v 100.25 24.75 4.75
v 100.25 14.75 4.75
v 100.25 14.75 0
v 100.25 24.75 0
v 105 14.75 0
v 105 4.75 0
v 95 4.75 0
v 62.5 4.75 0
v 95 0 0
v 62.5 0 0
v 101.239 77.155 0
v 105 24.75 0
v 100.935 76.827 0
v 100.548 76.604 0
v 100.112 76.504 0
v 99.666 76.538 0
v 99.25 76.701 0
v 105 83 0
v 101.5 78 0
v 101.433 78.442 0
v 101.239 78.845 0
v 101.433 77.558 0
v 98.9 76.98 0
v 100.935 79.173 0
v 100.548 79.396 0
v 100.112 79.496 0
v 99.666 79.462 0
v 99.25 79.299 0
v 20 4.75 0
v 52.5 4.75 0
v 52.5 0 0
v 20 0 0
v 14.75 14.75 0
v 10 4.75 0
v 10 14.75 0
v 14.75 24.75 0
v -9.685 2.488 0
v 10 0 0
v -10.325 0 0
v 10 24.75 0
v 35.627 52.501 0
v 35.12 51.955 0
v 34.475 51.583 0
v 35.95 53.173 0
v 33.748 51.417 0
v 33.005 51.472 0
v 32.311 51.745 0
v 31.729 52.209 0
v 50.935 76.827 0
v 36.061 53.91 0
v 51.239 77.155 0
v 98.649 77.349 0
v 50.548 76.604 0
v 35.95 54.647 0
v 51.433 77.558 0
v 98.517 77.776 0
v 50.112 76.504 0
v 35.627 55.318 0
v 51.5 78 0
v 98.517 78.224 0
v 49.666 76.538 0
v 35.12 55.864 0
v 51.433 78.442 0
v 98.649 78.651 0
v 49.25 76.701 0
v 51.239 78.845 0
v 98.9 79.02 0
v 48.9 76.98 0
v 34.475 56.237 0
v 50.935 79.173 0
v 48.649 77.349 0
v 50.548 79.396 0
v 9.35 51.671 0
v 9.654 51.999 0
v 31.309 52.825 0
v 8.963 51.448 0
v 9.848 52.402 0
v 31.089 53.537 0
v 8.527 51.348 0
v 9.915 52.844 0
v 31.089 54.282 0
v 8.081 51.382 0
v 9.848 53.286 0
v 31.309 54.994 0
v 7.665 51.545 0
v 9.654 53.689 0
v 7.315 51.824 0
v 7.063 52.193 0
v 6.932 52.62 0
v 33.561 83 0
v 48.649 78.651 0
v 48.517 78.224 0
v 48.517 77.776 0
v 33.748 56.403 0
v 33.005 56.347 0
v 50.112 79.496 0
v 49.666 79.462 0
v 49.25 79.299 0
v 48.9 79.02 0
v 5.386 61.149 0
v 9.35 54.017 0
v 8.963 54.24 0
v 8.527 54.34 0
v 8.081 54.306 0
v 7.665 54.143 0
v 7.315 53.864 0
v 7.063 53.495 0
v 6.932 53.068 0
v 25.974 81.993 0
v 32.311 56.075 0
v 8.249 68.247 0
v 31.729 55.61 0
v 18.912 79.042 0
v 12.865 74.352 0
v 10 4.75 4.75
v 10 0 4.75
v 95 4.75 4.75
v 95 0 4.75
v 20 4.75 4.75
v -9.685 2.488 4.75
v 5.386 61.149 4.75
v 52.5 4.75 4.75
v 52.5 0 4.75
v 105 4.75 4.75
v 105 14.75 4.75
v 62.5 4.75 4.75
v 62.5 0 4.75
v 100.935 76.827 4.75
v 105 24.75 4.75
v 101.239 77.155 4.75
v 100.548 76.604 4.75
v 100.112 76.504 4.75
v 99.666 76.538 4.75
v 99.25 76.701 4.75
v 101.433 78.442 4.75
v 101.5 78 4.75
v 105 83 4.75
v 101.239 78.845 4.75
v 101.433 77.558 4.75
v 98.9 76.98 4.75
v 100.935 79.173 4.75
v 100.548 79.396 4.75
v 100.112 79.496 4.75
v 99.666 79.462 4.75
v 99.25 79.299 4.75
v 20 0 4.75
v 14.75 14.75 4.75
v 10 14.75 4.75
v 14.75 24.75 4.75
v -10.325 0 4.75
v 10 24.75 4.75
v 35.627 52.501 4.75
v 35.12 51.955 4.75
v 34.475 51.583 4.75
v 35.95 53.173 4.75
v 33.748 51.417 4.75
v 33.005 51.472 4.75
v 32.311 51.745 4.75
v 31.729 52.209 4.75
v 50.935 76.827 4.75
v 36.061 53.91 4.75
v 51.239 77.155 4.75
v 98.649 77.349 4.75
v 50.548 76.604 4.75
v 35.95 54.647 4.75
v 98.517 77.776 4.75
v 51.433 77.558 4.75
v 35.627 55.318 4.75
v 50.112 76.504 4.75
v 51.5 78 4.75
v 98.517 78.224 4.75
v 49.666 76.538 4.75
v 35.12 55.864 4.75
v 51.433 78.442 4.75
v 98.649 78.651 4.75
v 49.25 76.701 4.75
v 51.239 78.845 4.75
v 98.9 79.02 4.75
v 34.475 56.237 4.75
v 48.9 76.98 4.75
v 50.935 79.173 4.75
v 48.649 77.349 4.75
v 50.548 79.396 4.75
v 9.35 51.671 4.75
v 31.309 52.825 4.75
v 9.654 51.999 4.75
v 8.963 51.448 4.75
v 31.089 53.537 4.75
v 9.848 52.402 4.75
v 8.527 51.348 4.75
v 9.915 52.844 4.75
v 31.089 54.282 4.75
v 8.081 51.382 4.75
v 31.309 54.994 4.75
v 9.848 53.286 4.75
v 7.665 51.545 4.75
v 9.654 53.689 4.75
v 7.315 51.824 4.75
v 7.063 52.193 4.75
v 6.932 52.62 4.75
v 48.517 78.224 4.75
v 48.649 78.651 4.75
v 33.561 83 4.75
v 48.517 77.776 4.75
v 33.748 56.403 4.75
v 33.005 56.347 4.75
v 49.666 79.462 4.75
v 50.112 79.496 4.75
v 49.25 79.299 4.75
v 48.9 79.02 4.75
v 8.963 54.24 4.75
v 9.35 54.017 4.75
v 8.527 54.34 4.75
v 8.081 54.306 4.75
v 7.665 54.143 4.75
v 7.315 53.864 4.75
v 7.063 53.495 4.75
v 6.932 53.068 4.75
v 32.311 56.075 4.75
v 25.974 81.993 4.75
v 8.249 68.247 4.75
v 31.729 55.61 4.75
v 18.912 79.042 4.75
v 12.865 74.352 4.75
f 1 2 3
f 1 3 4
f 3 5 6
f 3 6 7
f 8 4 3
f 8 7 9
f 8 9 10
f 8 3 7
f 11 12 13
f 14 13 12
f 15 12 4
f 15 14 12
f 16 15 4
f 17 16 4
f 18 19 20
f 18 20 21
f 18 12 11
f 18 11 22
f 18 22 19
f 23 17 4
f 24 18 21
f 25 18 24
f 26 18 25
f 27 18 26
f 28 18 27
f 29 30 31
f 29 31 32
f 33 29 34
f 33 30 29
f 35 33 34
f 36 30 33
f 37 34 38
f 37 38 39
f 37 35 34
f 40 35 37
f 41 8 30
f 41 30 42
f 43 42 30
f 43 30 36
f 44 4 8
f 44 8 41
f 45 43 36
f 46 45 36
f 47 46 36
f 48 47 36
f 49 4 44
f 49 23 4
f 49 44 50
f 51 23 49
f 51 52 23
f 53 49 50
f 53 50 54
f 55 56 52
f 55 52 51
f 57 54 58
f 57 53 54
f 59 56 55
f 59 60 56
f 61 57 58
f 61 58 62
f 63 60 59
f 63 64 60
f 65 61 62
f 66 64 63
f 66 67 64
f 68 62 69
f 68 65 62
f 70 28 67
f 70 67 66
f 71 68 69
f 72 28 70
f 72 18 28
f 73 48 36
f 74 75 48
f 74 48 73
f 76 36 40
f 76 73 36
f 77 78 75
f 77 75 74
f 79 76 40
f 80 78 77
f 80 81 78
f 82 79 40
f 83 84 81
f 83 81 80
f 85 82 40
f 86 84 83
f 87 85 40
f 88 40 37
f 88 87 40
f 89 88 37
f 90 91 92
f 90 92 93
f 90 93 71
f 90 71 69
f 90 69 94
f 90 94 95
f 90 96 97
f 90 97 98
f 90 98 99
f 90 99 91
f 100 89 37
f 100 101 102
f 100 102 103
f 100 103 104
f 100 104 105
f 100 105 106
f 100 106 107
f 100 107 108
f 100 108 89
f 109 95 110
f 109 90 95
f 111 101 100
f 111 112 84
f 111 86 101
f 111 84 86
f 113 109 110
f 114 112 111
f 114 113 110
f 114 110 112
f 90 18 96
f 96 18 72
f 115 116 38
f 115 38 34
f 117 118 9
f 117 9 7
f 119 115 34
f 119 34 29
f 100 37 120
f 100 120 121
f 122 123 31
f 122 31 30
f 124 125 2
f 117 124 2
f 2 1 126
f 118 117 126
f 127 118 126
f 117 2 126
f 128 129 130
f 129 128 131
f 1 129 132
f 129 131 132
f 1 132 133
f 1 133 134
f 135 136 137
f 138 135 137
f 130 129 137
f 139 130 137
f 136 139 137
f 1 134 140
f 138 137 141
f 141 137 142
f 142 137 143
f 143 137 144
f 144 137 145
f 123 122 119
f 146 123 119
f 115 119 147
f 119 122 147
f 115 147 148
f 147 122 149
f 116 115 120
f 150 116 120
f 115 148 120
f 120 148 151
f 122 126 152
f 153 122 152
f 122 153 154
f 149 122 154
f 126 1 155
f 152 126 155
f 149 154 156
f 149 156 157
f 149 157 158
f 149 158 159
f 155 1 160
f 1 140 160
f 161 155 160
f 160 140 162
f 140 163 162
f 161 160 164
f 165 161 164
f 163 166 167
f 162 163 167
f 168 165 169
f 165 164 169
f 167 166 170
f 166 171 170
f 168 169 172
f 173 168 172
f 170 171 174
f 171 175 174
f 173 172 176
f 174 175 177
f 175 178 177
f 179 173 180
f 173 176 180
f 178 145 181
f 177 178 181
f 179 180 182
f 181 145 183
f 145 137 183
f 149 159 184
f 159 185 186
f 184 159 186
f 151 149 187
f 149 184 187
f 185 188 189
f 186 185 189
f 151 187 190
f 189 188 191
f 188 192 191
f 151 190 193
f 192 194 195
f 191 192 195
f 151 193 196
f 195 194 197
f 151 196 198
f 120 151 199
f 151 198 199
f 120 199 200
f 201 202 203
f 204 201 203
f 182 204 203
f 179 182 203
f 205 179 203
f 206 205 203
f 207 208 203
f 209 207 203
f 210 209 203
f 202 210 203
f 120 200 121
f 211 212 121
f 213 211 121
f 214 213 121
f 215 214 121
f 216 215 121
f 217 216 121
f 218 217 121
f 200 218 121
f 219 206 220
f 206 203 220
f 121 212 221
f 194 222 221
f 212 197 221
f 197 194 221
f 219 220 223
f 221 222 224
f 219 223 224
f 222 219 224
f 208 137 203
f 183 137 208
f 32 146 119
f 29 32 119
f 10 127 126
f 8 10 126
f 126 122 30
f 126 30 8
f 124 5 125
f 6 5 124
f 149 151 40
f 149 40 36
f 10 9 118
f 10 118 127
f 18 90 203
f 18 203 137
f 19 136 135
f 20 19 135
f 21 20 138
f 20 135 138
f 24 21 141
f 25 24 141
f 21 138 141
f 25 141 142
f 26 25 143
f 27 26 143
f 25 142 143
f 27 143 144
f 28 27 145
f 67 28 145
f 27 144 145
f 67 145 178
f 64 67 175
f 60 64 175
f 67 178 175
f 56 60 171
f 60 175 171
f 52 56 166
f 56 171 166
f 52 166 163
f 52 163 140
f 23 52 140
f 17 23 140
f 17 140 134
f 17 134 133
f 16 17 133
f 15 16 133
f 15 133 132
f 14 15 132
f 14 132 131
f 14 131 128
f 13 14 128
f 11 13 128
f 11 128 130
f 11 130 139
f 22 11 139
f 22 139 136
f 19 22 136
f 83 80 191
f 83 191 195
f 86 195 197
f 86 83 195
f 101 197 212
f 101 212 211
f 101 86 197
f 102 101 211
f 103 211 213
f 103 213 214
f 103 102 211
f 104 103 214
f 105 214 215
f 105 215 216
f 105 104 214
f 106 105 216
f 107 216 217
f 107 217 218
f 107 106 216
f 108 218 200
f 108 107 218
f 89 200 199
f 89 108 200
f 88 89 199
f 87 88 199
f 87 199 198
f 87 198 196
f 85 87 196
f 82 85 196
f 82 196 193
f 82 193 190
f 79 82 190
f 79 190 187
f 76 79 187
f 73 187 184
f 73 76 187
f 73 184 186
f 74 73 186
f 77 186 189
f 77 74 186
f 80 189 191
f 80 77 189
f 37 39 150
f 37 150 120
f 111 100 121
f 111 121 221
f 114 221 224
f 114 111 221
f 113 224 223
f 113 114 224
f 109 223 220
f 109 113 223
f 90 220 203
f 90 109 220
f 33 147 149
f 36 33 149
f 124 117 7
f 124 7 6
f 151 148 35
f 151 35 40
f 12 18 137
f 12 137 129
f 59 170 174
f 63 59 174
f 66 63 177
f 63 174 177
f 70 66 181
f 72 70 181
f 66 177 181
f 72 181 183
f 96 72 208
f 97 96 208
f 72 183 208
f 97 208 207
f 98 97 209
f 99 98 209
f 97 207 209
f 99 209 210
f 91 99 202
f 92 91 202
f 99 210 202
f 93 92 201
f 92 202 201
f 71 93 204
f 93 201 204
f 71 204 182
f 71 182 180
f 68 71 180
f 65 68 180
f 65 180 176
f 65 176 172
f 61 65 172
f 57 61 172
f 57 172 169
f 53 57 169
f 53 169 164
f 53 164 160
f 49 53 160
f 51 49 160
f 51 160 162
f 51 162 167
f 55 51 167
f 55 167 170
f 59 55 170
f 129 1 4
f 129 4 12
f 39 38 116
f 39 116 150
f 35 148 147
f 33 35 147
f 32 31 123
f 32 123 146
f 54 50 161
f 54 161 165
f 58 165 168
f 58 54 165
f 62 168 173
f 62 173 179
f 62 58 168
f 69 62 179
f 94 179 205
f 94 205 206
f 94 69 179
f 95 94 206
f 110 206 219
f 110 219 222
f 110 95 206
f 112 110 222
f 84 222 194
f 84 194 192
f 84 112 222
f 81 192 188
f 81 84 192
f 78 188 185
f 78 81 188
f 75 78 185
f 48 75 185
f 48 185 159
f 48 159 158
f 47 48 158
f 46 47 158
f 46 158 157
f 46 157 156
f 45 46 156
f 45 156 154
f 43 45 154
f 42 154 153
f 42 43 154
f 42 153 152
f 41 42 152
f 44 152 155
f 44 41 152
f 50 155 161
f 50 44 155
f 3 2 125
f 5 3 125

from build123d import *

# Parameters (mm, degrees)
SKETCH1_R           = 2.5
BOSS_EXTRUDE1_DEPTH = 4.75
SKETCH2_W           = 10
SKETCH2_H           = 4.75
SKETCH2_W_2         = 4.75
SKETCH2_H_2         = 10
CUT_EXTRUDE1_DEPTH  = 134.927452376
SKETCH3_R           = 1.5
CUT_EXTRUDE2_DEPTH  = 134.927452376
CAVITY1_OUTLINE_R   = 1.5
CAVITY1_DEPTH       = 4.75


# Read off the part's stored shape, not the designer's step: Cavity1
with BuildPart() as part:
    # Sketch1 → Boss-Extrude1 (new body)
    with BuildSketch(Plane.XY):
        with BuildLine():
            Line((-9.685424338, 2.488484559), (5.386220056, 61.148792841))
            ThreePointArc((5.386220056, 61.148792841), (15.733633721, 76.897010412), (33.561388608, 83))
            Line((33.561388608, 83), (105, 83))
            Line((105, 83), (105, 0))
            Line((105, 0), (-10.324792855, 0))
            Line((-10.324792855, 0), (-9.685424338, 2.488484559))
        make_face()
        with Locations((33.561388608, 53.909722104)):
            Circle(SKETCH1_R, mode=Mode.SUBTRACT)
    extrude(amount=BOSS_EXTRUDE1_DEPTH)

    # Sketch2 → Cut-Extrude1 (cut, through all)
    with BuildSketch(Plane.XY.offset(4.75)):
        with Locations((15, 2.375)):
            Rectangle(SKETCH2_W, SKETCH2_H)
        with Locations((57.5, 2.375)):
            Rectangle(SKETCH2_W, SKETCH2_H)
        with Locations((100, 2.375)):
            Rectangle(SKETCH2_W, SKETCH2_H)
        with Locations((102.625, 19.75)):
            Rectangle(SKETCH2_W_2, SKETCH2_H_2)
        with Locations((12.375, 19.75)):
            Rectangle(SKETCH2_W_2, SKETCH2_H_2)
    extrude(amount=-CUT_EXTRUDE1_DEPTH, mode=Mode.SUBTRACT)

    # Sketch3 → Cut-Extrude2 (cut, through all)
    with BuildSketch(Plane.XY.offset(4.75)):
        with Locations((50, 78)):
            Circle(SKETCH3_R)
        with Locations((100, 78)):
            Circle(SKETCH3_R)
    extrude(amount=-CUT_EXTRUDE2_DEPTH, mode=Mode.SUBTRACT)

    # Cavity1 outline → Cavity1 (cut)
    with BuildSketch(Plane.XY):
        with Locations((8.414860226, 52.844005614)):
            Circle(CAVITY1_OUTLINE_R)
    extrude(amount=CAVITY1_DEPTH, mode=Mode.SUBTRACT)


solid = part.part
